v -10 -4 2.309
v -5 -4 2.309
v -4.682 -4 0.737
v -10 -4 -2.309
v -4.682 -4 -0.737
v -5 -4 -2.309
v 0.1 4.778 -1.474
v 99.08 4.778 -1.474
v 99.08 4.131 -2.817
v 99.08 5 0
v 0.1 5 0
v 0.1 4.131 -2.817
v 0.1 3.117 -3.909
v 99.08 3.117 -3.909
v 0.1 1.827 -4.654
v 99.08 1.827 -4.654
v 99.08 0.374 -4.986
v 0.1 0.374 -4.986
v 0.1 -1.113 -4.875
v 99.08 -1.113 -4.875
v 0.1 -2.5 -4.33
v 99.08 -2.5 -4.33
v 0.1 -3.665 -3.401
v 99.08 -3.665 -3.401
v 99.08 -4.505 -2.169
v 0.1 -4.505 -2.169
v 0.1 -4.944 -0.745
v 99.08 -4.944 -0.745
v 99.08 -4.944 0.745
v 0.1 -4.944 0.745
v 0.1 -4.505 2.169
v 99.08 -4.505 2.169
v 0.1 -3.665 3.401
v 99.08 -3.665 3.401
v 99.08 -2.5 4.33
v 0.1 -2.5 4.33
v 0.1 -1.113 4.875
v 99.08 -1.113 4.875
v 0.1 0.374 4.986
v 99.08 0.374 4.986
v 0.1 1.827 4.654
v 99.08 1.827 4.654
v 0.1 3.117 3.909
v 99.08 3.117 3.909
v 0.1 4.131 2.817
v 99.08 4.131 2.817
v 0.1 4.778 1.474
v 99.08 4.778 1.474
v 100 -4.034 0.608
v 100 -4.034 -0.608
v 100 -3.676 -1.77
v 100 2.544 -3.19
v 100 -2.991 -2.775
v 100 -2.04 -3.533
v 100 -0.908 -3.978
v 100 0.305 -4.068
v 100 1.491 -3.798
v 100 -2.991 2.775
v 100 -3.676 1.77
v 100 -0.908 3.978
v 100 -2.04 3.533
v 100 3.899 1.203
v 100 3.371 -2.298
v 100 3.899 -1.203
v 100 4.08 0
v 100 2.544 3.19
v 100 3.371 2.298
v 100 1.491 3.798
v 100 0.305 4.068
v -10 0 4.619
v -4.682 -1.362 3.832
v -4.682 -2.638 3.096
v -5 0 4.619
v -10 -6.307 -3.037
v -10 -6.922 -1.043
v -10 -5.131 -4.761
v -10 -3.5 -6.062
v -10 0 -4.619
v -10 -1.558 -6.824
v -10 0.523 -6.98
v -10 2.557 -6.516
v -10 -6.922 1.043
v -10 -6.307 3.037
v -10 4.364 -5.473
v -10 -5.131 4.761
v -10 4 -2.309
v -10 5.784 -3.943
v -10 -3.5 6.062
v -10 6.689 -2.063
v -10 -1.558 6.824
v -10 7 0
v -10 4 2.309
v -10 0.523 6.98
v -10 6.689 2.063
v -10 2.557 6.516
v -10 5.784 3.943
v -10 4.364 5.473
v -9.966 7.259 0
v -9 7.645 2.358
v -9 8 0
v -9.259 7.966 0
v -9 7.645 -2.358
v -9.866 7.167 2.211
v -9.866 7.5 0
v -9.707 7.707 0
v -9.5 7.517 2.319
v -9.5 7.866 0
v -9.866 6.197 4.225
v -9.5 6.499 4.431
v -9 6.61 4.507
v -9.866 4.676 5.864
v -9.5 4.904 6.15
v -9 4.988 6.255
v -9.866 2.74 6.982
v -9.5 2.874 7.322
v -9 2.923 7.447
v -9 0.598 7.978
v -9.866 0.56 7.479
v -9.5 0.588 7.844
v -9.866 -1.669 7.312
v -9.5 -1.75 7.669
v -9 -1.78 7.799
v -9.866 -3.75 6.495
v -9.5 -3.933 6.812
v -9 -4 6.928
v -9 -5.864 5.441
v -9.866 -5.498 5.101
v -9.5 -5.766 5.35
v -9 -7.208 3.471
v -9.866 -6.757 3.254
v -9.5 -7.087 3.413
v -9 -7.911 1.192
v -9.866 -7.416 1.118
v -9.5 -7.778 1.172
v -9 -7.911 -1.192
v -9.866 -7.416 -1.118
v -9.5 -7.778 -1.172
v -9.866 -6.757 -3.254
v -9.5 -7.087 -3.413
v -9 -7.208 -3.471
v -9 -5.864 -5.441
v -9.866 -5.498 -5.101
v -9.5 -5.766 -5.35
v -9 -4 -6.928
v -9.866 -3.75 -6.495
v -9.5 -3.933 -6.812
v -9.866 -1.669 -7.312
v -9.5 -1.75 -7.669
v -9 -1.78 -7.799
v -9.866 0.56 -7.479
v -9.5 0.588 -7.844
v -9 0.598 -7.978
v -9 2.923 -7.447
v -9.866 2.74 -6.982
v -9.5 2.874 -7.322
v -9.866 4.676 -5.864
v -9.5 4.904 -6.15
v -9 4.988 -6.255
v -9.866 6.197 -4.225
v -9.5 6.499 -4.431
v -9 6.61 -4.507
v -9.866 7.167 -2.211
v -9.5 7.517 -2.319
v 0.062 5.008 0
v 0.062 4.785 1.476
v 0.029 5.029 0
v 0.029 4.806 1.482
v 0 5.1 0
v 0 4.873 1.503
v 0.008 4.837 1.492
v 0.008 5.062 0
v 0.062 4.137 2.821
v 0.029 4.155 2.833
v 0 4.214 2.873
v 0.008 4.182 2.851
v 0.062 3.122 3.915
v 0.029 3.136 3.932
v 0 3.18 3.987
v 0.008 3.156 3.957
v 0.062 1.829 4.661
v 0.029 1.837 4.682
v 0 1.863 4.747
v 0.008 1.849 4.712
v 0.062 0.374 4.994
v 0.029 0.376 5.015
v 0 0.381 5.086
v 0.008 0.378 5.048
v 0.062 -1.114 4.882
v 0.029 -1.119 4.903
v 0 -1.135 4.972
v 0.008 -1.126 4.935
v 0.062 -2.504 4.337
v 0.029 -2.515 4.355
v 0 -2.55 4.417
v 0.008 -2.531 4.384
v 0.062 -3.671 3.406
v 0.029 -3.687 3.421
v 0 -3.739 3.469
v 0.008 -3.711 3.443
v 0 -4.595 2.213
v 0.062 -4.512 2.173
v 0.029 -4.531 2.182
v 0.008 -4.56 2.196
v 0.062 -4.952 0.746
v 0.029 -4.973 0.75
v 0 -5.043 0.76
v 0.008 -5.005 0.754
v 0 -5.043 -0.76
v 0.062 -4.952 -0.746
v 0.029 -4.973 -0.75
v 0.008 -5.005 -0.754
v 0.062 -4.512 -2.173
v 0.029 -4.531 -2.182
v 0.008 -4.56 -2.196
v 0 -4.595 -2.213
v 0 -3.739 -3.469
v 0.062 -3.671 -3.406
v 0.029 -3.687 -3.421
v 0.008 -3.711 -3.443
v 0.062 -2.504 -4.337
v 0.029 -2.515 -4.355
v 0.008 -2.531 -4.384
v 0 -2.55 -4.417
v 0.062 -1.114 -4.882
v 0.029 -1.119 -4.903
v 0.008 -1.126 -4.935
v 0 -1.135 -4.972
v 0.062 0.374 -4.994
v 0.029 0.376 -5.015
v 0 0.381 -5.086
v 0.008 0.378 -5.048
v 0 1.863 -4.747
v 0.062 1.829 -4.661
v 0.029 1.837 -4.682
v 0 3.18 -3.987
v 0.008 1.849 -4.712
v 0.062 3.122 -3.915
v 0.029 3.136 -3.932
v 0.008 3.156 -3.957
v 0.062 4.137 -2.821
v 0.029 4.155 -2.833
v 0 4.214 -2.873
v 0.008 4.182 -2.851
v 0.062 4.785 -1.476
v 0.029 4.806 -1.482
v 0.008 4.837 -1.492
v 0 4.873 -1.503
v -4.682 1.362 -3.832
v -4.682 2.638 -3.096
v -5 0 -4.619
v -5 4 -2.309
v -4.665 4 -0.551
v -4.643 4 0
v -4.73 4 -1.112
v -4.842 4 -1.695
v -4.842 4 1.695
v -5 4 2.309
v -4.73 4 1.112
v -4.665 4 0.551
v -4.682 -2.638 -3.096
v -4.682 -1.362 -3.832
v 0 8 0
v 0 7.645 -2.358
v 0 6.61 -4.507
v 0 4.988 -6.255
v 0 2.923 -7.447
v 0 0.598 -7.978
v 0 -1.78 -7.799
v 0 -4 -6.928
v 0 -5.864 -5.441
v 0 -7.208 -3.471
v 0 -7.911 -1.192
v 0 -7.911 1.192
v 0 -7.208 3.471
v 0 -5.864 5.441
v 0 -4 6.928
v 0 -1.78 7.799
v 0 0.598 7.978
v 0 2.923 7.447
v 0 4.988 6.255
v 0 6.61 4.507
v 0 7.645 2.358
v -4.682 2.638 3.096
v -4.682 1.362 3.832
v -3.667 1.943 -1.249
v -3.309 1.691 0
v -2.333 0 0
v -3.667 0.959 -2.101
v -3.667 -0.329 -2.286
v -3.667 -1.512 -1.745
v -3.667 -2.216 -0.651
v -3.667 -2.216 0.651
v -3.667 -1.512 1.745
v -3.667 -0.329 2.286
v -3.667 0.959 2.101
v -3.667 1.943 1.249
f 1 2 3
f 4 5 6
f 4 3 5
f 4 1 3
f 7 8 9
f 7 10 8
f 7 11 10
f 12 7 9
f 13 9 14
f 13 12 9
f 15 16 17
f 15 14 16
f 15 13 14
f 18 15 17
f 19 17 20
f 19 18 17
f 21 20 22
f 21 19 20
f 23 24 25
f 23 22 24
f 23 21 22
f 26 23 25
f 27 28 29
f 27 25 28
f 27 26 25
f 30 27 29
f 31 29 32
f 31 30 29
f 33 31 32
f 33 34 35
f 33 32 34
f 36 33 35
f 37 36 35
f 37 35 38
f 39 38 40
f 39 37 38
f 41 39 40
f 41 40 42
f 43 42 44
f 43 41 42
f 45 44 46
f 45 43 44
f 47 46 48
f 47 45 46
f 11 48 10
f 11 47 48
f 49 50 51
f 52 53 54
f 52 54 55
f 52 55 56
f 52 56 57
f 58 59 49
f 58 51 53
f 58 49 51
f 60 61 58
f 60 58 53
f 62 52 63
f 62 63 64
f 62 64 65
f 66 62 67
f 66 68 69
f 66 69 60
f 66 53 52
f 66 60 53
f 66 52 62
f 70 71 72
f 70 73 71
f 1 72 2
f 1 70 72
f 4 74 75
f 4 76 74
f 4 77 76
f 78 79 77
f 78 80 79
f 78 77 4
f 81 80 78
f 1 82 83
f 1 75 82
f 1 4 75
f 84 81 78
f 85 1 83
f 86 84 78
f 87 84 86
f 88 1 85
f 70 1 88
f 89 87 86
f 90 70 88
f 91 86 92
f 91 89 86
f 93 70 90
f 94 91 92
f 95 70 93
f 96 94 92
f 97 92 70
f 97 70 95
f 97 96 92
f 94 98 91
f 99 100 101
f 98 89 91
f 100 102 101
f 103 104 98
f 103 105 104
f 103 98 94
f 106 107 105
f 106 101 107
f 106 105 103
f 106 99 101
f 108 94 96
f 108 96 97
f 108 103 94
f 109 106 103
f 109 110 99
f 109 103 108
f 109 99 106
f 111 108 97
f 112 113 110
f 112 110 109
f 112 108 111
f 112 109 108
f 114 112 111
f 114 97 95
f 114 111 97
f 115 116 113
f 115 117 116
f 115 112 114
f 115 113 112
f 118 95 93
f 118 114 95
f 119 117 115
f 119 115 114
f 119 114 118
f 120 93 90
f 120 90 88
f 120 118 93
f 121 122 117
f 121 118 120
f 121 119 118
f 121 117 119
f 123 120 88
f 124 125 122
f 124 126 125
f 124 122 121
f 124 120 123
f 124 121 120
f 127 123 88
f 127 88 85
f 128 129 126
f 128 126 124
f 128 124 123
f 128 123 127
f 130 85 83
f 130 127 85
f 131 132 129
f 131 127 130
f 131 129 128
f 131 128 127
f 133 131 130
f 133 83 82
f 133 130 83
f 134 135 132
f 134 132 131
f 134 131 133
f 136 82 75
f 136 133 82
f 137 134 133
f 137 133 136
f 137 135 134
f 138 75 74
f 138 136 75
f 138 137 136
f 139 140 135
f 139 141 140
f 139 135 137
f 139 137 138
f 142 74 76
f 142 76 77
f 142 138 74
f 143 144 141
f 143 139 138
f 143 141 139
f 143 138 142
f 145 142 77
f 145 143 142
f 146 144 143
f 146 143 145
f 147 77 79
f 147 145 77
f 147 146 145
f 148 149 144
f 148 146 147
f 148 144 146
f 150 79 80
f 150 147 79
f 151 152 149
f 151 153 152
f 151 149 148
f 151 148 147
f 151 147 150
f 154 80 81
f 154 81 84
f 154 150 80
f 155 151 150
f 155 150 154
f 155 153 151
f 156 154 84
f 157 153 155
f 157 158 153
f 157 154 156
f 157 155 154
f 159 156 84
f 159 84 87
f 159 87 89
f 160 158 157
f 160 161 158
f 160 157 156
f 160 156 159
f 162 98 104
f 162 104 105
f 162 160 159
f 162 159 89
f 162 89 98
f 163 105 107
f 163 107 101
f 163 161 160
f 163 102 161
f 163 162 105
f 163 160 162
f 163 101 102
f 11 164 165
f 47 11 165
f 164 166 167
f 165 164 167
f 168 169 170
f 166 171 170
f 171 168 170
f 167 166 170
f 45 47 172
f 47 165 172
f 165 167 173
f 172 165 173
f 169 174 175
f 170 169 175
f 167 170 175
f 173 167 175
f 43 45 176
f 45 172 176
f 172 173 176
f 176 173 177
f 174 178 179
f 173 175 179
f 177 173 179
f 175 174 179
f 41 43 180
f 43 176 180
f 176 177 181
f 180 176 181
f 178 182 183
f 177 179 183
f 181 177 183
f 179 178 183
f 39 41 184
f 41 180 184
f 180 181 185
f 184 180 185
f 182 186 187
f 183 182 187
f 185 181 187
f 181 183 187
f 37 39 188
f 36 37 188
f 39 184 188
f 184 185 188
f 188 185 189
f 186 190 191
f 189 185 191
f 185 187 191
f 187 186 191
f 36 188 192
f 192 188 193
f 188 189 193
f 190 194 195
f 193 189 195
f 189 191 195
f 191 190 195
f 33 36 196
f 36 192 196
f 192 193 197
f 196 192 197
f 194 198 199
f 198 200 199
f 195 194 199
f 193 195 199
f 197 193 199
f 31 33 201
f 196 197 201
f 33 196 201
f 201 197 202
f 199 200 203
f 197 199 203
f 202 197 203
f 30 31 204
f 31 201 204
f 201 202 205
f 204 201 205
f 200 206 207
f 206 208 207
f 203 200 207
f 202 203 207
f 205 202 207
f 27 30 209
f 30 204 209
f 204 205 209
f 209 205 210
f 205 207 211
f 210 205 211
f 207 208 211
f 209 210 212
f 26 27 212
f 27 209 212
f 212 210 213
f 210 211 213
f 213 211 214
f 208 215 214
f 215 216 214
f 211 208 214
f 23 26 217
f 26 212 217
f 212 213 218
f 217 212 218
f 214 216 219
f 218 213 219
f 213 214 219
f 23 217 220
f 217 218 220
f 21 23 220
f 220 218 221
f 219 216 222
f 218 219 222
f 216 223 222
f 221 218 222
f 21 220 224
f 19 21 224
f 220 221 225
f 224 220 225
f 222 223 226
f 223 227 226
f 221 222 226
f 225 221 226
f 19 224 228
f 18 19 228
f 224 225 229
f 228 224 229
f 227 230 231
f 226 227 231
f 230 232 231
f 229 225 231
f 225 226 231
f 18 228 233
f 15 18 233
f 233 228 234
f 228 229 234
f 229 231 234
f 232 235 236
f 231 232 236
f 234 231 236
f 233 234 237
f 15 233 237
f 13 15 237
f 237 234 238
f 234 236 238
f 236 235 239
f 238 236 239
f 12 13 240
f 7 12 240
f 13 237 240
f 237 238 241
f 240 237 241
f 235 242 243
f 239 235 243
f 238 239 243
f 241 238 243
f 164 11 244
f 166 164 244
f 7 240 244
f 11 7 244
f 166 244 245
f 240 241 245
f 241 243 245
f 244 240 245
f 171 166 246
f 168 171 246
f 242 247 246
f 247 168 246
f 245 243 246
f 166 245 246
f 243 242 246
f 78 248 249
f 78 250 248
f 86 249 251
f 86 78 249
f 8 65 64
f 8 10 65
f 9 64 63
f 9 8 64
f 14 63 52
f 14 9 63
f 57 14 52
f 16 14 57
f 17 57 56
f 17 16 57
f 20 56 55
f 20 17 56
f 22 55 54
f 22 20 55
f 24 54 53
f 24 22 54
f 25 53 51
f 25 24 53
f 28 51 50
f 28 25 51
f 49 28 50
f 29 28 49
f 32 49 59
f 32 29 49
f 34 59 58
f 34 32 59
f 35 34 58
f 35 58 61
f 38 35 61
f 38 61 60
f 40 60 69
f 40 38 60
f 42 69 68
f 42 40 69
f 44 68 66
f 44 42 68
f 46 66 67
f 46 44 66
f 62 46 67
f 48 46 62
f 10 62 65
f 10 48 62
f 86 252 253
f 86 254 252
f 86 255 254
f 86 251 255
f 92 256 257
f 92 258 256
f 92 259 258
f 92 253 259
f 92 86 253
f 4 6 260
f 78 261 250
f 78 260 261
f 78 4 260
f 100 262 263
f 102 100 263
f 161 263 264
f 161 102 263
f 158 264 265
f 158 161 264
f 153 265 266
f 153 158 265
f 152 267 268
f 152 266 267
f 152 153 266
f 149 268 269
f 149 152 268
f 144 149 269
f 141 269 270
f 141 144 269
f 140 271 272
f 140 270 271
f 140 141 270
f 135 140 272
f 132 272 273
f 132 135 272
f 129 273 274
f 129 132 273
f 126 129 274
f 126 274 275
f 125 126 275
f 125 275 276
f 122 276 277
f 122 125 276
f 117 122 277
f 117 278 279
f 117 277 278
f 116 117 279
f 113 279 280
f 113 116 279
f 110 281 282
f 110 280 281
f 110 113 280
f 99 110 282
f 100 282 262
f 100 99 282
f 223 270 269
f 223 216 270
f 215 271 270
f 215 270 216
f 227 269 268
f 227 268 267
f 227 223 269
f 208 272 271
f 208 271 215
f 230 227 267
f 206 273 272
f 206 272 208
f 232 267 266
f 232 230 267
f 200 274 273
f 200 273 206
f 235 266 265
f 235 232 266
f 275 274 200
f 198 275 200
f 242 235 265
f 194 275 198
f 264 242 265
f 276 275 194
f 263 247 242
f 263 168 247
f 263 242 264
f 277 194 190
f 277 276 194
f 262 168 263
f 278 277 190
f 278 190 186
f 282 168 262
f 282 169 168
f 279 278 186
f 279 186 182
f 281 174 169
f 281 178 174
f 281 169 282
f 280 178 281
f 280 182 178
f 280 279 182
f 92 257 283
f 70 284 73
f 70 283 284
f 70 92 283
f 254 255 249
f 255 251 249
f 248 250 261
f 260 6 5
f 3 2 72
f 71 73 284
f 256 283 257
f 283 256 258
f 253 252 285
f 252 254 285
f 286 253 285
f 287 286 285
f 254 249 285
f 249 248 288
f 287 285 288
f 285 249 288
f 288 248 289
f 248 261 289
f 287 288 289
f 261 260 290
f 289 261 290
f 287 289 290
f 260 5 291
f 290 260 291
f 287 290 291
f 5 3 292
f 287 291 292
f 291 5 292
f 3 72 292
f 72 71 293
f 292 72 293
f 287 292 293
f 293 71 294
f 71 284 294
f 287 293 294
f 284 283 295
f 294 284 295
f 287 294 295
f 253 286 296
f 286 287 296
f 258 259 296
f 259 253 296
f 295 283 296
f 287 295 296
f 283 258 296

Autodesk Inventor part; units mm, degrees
ref_plane "YZ Plane" through (0, 0, 0) normal (1, 0, 0) x (0, 1, 0)
ref_plane "XZ Plane" through (0, 0, 0) normal (0, 1, 0) x (-1, 0, 0)
sketch "Эскиз1" plane through (0, 0, 0) normal (0, 0, 1) x (1, 0, 0)
  line L0 (-2.3333, 0) -> (100, 0)
  line L1 (100, 0) -> (100, 5)
  line L2 (100, 5) -> (74, 5)
  line L3 (74, 5) -> (73.0797, 5)
  line L4 (73.0797, 5) -> (0, 5)
  line L5 (0, 5) -> (0, 8)
  line L6 (0, 8) -> (-10, 8)
  line L7 (-10, 8) -> (-10, 4.6188)
  line L8 (-10, 4.6188) -> (-5, 4.6188)
  line L9 (-5, 4.6188) -> (-2.3333, 0)
  line L10 (-33, 0) -> (128, 0) projected
  line L11 (0, -1.6) -> (0, 9.6) projected
  line L12 (74, 5) -> (0, 5) construction
  dimension "d1" = 26
  dimension "d2" = 0.9203
  dimension "d3" = 10
  dimension "d4" = 5
  dimension "d5" = 60
  dimension "d6" = 10
  dimension "d7" = 10
  dimension "d8" = 9.2376
  dimension "d9" = 16
  dimension "d26" = 100
revolve "Базовый элемент" add sketch "Эскиз1" angle 360 about axis through (-2.3333, 0, 0) along (1, 0, 0)
sketch "Эскиз2" plane through (-10, 0, 0) normal (-1, 0, 0) x (0, 0, 1)
  circle A0 centre (0, 0) radius 4.6188 projected
  line L0 (0, -11.2) -> (0, 11.2) projected
  line L1 (-11.2, 0) -> (11.2, 0) projected
  line L2 (4.6188, 0) -> (2.3094, -4)
  line L3 (2.3094, -4) -> (-2.3094, -4)
  line L4 (-2.3094, -4) -> (-4.6188, 0)
  line L5 (-4.6188, 0) -> (-2.3094, 4)
  line L6 (-2.3094, 4) -> (2.3094, 4)
  line L7 (2.3094, 4) -> (4.6188, 0)
extrude "Паз" add sketch "Эскиз2" against normal up to next contours L7 A0 | A0 L2 | L6 L0 A0 | A0 L0 L3 | L0 L6 A0 | A0 L3 L0 | L4 A0 | A0 L5
fillet "Сопряжение1" radius 1 1 edges at (-10, -8, 0)
thread "Резьба" size "M10x1.5" class "6g" standard "ISO Metric profile" length 26
chamfer "Фаска1" distance 0.9202 distance2 0.9202 1 edges at (100, -5, 0) measured on face at (100, -0.4485, 2.7318)
ref_plane "Work Plane1" through (29, 0, 0) normal (0, -1, 0) x (1, 0, 0)
fillet "Fillet2" radius 0.1 1 edges at (0, -5, 0)
equation "\"d1\" = GEL"
equation "\"d3\" = KOH"
equation "\"d4\" = INTI"
equation "\"d6\" = GD"
equation "\"d7\" = BDM"
equation "\"d8\" = 1.1547 * SW"
equation "\"d9\" = KOD"
equation "\"d26\" = NLG"
equation "\"d30\" = R"
equation "\"d17\" = RR"
equation "\"d13\" = GEL"
equation "\"d15\" = -0.5 * SPD + 0.5 * GD"
equation "\"d16\" = GUL"
equation "\"GD\" = NND"
equation "\"NLG\" = 100"
equation "\"GEL\" = 26"
equation "\"KOD\" = 16"
equation "\"KOH\" = NND"
equation "\"INTI\" = 5"
equation "\"GAL\" = 0.61345 * PTC"
equation "\"GUL\" = 0.61345 * PTC"
equation "\"BDM\" = NND"
equation "\"SW\" = 8"
equation "\"RR\" = 0.1 * NND"
equation "\"SPD\" = NND - 1.2269 * PTC"
equation "\"R\" = 0.1"
equation "\"PHH\" = 0.2"
equation "\"GD1\" = THREADDIA - 1.2269 * PTC"
equation "\"FAWI\" = 45deg"
equation "\"PTC\" = 1.5"
equation "\"KOH1\" = 9"
equation "\"TOA\" = 30deg"
equation "\"E0\" = 1.155 * SW"
equation "\"NND\" = 10"
equation "\"THREADDIA\" = 10"
properties part number "AS 1420 - 1973 - M10 x 80" material "Сталь, мягкая"
